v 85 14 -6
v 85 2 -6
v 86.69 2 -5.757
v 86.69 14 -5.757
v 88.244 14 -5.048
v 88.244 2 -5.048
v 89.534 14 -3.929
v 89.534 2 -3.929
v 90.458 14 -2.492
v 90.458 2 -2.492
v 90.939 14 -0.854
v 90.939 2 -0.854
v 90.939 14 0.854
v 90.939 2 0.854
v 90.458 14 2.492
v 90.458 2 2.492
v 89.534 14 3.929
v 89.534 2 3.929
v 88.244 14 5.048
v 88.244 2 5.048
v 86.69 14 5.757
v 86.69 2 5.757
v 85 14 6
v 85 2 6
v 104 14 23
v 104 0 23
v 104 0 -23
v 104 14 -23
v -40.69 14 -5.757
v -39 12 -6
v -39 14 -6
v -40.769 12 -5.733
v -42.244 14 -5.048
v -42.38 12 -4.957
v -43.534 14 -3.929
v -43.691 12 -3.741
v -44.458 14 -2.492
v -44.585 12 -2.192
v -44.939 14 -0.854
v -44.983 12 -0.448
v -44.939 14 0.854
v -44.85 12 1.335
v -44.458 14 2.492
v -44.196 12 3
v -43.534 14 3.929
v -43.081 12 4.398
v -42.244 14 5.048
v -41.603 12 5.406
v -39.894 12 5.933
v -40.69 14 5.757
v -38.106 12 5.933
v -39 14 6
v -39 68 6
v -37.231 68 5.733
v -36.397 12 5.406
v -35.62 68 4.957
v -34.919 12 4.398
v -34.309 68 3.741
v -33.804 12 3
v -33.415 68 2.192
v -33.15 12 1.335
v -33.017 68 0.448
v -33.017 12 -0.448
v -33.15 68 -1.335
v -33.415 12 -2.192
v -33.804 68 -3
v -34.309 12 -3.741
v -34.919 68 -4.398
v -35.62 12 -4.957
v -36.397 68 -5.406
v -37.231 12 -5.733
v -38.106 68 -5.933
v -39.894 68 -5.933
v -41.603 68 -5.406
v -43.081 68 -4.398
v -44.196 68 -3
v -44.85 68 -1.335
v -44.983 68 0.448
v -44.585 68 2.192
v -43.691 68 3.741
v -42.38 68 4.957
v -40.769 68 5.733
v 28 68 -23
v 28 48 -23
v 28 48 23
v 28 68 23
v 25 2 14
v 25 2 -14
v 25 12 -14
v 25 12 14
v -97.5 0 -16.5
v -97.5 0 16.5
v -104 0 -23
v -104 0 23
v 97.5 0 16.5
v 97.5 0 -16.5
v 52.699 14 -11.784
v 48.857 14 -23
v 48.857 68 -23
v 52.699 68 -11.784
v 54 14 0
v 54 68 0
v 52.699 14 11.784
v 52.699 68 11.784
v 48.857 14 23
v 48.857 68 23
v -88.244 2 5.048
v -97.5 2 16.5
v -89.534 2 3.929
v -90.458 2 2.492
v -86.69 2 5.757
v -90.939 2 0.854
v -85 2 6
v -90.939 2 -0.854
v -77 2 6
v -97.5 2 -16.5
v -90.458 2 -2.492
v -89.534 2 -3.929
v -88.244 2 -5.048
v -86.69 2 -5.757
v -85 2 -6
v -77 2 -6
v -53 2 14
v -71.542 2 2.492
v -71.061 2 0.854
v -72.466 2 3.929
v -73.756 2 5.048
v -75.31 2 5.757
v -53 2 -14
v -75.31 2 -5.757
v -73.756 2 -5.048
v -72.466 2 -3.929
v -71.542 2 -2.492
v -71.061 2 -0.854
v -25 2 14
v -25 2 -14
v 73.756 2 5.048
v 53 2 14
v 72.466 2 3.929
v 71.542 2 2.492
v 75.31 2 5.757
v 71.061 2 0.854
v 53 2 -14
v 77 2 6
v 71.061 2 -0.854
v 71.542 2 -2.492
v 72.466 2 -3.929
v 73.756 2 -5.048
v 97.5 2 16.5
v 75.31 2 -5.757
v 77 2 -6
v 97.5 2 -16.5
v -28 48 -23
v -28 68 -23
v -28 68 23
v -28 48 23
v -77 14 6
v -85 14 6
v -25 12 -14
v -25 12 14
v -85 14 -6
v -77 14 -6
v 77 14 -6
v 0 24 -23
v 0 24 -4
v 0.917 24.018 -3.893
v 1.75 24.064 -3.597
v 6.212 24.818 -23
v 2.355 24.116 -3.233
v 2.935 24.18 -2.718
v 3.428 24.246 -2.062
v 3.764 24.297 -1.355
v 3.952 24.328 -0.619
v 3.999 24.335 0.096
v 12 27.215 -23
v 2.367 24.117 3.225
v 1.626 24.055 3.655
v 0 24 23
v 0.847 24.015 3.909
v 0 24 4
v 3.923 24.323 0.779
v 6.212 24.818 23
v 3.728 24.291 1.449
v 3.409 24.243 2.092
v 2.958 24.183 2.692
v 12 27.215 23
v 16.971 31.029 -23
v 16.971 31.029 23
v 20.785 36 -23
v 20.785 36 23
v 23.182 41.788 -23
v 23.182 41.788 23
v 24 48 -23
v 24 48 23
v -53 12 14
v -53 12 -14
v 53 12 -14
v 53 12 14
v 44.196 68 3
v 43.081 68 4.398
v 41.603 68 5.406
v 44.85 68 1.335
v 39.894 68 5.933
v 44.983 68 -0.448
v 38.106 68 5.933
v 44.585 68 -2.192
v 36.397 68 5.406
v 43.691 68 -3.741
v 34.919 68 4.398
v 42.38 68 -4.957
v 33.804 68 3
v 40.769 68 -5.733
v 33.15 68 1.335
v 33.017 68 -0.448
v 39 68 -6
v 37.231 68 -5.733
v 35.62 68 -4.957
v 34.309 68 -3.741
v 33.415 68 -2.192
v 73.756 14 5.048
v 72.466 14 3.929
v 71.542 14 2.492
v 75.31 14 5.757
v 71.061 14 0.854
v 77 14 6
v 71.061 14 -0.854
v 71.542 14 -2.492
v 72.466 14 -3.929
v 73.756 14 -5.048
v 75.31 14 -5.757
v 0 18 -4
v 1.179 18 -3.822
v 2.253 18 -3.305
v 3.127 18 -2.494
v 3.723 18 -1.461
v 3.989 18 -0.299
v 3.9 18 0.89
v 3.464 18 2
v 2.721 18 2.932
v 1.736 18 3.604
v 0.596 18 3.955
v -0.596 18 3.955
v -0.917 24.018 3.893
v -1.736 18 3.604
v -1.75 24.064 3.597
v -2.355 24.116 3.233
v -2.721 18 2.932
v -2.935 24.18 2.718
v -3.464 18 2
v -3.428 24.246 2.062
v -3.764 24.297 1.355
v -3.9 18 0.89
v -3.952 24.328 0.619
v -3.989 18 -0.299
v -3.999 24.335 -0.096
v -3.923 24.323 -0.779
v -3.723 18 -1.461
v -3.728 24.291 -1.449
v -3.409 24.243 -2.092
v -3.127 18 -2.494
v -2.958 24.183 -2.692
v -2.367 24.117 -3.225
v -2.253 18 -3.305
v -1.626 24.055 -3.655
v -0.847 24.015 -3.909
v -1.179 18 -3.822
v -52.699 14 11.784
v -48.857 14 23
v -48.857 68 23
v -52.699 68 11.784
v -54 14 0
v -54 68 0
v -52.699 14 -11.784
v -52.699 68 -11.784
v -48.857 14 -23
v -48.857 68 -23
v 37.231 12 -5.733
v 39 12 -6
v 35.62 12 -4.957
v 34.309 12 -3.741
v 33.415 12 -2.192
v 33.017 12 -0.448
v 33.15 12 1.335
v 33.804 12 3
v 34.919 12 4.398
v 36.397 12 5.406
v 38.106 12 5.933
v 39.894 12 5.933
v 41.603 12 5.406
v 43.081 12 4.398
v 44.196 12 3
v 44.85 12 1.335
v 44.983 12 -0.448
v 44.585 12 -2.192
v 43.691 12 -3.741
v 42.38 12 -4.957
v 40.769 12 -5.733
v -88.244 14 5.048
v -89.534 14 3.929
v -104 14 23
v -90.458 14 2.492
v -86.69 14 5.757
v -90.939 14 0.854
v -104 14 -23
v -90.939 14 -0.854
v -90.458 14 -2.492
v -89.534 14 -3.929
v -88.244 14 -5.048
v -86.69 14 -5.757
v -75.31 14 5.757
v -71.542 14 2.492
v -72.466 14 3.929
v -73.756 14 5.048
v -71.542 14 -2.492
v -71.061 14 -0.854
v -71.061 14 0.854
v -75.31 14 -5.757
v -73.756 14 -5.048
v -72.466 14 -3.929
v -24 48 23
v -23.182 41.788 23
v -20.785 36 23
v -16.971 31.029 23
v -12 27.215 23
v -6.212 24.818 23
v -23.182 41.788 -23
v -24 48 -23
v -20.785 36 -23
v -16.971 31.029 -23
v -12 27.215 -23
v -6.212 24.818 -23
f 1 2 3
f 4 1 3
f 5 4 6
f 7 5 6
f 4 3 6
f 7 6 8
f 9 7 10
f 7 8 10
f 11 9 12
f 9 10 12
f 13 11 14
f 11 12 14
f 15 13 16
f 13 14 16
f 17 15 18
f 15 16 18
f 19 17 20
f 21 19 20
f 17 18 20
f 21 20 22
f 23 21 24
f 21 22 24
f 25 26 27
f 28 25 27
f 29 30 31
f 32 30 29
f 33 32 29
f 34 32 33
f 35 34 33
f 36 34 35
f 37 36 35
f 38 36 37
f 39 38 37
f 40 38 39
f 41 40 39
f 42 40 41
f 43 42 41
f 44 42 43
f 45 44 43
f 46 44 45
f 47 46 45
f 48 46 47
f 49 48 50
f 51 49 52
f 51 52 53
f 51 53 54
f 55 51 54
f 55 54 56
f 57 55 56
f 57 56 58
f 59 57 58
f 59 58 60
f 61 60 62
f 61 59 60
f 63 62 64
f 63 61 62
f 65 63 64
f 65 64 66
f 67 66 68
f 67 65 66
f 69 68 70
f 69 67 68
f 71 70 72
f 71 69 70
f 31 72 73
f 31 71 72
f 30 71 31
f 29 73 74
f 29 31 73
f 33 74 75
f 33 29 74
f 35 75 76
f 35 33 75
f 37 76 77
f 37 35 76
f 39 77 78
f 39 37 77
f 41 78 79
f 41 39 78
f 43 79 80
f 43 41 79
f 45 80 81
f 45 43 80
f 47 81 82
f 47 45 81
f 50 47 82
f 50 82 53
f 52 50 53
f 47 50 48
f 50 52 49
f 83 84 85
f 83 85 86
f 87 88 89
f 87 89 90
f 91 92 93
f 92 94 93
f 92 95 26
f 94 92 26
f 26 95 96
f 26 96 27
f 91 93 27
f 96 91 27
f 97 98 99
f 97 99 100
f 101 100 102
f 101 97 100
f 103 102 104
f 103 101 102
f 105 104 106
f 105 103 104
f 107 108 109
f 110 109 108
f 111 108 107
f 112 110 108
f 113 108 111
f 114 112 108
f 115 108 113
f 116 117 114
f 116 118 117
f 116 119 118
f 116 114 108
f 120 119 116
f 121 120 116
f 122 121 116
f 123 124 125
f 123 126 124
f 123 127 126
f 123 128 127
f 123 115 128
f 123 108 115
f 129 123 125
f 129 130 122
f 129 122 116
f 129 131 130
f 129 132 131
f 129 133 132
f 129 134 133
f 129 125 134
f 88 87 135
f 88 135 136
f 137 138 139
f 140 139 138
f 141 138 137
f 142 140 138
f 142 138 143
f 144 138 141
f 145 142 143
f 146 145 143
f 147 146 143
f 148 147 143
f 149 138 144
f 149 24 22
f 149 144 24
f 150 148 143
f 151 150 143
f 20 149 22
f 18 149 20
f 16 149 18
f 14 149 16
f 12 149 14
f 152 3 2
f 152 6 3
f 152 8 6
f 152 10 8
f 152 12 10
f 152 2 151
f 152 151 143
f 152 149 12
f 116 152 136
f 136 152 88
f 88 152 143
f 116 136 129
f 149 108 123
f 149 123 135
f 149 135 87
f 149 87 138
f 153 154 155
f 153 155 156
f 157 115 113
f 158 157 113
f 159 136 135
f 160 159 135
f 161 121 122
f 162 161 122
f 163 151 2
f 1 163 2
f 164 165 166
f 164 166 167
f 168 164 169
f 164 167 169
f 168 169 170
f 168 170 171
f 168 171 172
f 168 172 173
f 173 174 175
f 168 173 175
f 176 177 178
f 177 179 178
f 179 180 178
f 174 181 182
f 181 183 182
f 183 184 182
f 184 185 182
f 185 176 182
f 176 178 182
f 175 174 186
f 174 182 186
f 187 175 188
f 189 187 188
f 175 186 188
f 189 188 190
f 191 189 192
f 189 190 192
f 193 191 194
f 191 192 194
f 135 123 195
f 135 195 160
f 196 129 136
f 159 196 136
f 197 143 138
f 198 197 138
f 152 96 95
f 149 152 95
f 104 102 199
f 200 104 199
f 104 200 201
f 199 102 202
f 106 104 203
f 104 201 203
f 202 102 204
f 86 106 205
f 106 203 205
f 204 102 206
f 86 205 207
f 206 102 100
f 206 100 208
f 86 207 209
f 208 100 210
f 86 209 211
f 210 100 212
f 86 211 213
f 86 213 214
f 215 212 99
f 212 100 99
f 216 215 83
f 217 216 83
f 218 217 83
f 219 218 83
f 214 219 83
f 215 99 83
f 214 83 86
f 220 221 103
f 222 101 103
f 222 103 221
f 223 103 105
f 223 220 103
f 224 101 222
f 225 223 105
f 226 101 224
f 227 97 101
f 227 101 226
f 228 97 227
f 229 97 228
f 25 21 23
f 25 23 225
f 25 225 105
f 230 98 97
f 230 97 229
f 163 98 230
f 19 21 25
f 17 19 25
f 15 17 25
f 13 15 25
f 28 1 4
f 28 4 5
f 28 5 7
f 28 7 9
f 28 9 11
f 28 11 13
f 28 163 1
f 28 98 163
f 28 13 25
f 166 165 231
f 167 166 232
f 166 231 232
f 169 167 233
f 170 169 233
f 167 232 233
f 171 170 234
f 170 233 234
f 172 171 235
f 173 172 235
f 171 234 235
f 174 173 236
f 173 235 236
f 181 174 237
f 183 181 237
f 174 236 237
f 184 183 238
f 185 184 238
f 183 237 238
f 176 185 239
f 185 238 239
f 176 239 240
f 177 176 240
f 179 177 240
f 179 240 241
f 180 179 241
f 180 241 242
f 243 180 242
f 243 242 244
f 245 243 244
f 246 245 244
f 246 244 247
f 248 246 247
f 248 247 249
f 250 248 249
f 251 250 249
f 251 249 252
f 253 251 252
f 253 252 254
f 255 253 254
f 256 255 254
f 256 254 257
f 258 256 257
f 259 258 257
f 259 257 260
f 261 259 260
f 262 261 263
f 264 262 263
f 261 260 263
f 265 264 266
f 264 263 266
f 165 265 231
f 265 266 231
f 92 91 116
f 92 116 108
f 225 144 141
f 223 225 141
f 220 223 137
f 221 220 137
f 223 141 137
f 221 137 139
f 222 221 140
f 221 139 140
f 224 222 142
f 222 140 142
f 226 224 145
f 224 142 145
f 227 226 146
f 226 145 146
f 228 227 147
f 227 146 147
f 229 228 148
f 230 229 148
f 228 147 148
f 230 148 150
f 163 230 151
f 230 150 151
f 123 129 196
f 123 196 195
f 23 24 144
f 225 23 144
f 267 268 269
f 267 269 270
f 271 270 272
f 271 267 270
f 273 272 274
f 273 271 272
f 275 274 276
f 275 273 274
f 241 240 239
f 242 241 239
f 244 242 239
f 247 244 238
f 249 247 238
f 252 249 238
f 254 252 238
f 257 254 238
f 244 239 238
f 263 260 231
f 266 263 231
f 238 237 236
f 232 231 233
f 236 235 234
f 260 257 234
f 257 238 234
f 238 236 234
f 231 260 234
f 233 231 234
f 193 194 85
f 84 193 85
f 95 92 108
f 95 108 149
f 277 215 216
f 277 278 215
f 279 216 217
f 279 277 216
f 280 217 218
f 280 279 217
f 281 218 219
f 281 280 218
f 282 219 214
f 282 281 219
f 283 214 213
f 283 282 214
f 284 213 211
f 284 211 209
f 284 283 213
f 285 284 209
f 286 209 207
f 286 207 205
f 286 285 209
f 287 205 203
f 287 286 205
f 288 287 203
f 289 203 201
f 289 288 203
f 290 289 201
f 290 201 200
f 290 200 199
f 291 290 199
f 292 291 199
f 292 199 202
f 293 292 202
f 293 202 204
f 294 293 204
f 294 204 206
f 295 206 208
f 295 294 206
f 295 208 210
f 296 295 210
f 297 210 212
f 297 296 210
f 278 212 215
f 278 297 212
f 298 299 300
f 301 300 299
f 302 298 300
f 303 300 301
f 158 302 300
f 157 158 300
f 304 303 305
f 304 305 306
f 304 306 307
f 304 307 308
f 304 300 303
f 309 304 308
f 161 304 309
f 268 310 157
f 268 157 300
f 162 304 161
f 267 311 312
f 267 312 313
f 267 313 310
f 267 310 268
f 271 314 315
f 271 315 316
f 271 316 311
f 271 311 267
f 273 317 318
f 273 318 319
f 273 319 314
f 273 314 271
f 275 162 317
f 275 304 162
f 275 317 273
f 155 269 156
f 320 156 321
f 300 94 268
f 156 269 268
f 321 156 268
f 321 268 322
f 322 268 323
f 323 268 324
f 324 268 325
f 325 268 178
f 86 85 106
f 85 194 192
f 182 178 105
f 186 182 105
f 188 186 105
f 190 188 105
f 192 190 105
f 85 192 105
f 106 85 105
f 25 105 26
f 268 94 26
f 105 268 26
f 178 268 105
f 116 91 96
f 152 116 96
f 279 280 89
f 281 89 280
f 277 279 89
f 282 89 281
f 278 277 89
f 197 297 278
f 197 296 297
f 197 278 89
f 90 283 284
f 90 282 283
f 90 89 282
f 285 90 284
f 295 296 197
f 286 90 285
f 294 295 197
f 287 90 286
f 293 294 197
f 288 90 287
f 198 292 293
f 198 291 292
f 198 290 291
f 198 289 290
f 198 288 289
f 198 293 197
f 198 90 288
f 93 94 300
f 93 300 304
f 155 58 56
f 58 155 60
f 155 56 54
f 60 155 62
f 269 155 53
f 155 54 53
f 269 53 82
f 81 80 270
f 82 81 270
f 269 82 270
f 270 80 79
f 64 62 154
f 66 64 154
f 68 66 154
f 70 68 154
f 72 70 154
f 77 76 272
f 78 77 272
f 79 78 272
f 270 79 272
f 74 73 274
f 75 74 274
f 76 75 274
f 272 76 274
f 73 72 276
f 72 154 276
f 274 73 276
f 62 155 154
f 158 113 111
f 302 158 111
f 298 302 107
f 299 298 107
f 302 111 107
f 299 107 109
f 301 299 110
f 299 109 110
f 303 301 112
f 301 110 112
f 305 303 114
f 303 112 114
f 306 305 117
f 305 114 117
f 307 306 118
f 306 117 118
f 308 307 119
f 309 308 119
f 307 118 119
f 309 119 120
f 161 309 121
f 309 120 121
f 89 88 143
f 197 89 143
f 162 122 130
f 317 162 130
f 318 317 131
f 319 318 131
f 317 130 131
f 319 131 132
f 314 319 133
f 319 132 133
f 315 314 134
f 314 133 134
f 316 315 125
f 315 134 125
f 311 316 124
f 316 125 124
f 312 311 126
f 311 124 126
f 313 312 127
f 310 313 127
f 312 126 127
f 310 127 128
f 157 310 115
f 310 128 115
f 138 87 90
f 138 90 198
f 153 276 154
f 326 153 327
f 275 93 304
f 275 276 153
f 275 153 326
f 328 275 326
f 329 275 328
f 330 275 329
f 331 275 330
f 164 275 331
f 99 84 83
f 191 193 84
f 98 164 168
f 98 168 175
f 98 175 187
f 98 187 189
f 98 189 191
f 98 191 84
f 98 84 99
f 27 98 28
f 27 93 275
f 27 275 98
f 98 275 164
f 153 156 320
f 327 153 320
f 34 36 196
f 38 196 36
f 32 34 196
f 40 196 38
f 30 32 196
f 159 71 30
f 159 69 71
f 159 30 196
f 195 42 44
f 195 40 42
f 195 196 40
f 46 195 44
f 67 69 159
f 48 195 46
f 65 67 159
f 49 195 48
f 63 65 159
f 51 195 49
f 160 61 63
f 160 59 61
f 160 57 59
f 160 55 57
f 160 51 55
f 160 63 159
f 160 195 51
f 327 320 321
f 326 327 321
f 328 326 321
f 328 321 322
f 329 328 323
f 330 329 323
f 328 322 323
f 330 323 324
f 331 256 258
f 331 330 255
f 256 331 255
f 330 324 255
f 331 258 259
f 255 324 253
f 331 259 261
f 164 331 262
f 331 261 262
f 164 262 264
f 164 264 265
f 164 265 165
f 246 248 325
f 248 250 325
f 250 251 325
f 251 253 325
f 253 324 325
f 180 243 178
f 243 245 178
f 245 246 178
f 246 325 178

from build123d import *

# Parameters (mm, degrees)
SKETCH1_W           = 208
SKETCH1_H           = 46
BOSS_EXTRUDE1_DEPTH = 14
SKETCH2_R           = 6
BOSS_EXTRUDE2_DEPTH = 54
SKETCH3_W           = 28
SKETCH3_H           = 28
CUT_EXTRUDE1_DEPTH  = 12
CUT_EXTRUDE2_START  = -12
SKETCH4_R           = 6
CUT_EXTRUDE2_DEPTH  = 12
SKETCH5_W           = 195
SKETCH5_H           = 33
CUT_EXTRUDE3_DEPTH  = 2
CUT_EXTRUDE4_DEPTH  = 133.4990566
SKETCH8_R           = 4
CUT_EXTRUDE7_DEPTH  = 126.303631232
SKETCH8_2_R         = 4
BOSS_EXTRUDE3_DEPTH = 16


with BuildPart() as part:
    # Sketch1 → Boss-Extrude1 (new body)
    with BuildSketch(Plane(origin=(0, 0, 0), x_dir=(1, 0, 0), z_dir=(0, 1, 0))):
        Rectangle(SKETCH1_W, SKETCH1_H)
        with BuildLine():
            Line((-85, 6), (-77, 6))
            ThreePointArc((-77, 6), (-71, 0), (-77, -6))
            Line((-77, -6), (-85, -6))
            ThreePointArc((-85, -6), (-91, 0), (-85, 6))
        make_face(mode=Mode.SUBTRACT)
        with BuildLine():
            Line((85, -6), (77, -6))
            ThreePointArc((77, -6), (71, 0), (77, 6))
            Line((77, 6), (85, 6))
            ThreePointArc((85, 6), (91, 0), (85, -6))
        make_face(mode=Mode.SUBTRACT)
    extrude(amount=BOSS_EXTRUDE1_DEPTH)

    # Sketch2 → Boss-Extrude2 (add)
    with BuildSketch(Plane(origin=(0, 14, 0), x_dir=(1, 0, 0), z_dir=(0, 1, 0))):
        with BuildLine():
            Line((-48.856934001, 23), (48.856934001, 23))
            ThreePointArc((48.856934001, 23), (54, 0), (48.856934001, -23))
            Line((48.856934001, -23), (-48.856934001, -23))
            ThreePointArc((-48.856934001, -23), (-54, 0), (-48.856934001, 23))
        make_face()
        with Locations((-39, 0)):
            Circle(SKETCH2_R, mode=Mode.SUBTRACT)
        with Locations((39, 0)):
            Circle(SKETCH2_R, mode=Mode.SUBTRACT)
    extrude(amount=BOSS_EXTRUDE2_DEPTH)

    # Sketch3 → Cut-Extrude1 (cut)
    with BuildSketch(Plane.XZ):
        with Locations((-39, 0)):
            Rectangle(SKETCH3_W, SKETCH3_H)
        with Locations((39, 0)):
            Rectangle(SKETCH3_W, SKETCH3_H)
    extrude(amount=-CUT_EXTRUDE1_DEPTH, mode=Mode.SUBTRACT)

    # Sketch4 → Cut-Extrude2 (cut)
    with BuildSketch(Plane(origin=(0, 14, 0), x_dir=(1, 0, 0), z_dir=(0, 1, 0)).offset(CUT_EXTRUDE2_START)):
        with Locations((39, 0)):
            Circle(SKETCH4_R)
        with Locations((-39, 0)):
            Circle(SKETCH4_R)
    extrude(amount=CUT_EXTRUDE2_DEPTH, mode=Mode.SUBTRACT)

    # Sketch5 → Cut-Extrude3 (cut)
    with BuildSketch(Plane.XZ):
        Rectangle(SKETCH5_W, SKETCH5_H)
    extrude(amount=-CUT_EXTRUDE3_DEPTH, mode=Mode.SUBTRACT)

    # Sketch6 → Cut-Extrude4 (cut, through all)
    with BuildSketch(Plane.XY.offset(23)):
        with BuildLine():
            Line((-28, 68), (-28, 48))
            Line((-28, 48), (-24, 48))
            ThreePointArc((-24, 48), (0, 24), (24, 48))
            Line((24, 48), (28, 48))
            Line((28, 48), (28, 68))
            Line((28, 68), (-28, 68))
        make_face()
    extrude(amount=-CUT_EXTRUDE4_DEPTH, mode=Mode.SUBTRACT)

    # Sketch8 → Cut-Extrude7 (cut, through all)
    with BuildSketch(Plane.XZ.offset(-2)):
        Circle(SKETCH8_R)
    extrude(amount=-CUT_EXTRUDE7_DEPTH, mode=Mode.SUBTRACT)

    # Sketch8<2> → Boss-Extrude3 (add)
    with BuildSketch(Plane.XZ.offset(-2)):
        Circle(SKETCH8_2_R)
    extrude(amount=-BOSS_EXTRUDE3_DEPTH)


solid = part.part
